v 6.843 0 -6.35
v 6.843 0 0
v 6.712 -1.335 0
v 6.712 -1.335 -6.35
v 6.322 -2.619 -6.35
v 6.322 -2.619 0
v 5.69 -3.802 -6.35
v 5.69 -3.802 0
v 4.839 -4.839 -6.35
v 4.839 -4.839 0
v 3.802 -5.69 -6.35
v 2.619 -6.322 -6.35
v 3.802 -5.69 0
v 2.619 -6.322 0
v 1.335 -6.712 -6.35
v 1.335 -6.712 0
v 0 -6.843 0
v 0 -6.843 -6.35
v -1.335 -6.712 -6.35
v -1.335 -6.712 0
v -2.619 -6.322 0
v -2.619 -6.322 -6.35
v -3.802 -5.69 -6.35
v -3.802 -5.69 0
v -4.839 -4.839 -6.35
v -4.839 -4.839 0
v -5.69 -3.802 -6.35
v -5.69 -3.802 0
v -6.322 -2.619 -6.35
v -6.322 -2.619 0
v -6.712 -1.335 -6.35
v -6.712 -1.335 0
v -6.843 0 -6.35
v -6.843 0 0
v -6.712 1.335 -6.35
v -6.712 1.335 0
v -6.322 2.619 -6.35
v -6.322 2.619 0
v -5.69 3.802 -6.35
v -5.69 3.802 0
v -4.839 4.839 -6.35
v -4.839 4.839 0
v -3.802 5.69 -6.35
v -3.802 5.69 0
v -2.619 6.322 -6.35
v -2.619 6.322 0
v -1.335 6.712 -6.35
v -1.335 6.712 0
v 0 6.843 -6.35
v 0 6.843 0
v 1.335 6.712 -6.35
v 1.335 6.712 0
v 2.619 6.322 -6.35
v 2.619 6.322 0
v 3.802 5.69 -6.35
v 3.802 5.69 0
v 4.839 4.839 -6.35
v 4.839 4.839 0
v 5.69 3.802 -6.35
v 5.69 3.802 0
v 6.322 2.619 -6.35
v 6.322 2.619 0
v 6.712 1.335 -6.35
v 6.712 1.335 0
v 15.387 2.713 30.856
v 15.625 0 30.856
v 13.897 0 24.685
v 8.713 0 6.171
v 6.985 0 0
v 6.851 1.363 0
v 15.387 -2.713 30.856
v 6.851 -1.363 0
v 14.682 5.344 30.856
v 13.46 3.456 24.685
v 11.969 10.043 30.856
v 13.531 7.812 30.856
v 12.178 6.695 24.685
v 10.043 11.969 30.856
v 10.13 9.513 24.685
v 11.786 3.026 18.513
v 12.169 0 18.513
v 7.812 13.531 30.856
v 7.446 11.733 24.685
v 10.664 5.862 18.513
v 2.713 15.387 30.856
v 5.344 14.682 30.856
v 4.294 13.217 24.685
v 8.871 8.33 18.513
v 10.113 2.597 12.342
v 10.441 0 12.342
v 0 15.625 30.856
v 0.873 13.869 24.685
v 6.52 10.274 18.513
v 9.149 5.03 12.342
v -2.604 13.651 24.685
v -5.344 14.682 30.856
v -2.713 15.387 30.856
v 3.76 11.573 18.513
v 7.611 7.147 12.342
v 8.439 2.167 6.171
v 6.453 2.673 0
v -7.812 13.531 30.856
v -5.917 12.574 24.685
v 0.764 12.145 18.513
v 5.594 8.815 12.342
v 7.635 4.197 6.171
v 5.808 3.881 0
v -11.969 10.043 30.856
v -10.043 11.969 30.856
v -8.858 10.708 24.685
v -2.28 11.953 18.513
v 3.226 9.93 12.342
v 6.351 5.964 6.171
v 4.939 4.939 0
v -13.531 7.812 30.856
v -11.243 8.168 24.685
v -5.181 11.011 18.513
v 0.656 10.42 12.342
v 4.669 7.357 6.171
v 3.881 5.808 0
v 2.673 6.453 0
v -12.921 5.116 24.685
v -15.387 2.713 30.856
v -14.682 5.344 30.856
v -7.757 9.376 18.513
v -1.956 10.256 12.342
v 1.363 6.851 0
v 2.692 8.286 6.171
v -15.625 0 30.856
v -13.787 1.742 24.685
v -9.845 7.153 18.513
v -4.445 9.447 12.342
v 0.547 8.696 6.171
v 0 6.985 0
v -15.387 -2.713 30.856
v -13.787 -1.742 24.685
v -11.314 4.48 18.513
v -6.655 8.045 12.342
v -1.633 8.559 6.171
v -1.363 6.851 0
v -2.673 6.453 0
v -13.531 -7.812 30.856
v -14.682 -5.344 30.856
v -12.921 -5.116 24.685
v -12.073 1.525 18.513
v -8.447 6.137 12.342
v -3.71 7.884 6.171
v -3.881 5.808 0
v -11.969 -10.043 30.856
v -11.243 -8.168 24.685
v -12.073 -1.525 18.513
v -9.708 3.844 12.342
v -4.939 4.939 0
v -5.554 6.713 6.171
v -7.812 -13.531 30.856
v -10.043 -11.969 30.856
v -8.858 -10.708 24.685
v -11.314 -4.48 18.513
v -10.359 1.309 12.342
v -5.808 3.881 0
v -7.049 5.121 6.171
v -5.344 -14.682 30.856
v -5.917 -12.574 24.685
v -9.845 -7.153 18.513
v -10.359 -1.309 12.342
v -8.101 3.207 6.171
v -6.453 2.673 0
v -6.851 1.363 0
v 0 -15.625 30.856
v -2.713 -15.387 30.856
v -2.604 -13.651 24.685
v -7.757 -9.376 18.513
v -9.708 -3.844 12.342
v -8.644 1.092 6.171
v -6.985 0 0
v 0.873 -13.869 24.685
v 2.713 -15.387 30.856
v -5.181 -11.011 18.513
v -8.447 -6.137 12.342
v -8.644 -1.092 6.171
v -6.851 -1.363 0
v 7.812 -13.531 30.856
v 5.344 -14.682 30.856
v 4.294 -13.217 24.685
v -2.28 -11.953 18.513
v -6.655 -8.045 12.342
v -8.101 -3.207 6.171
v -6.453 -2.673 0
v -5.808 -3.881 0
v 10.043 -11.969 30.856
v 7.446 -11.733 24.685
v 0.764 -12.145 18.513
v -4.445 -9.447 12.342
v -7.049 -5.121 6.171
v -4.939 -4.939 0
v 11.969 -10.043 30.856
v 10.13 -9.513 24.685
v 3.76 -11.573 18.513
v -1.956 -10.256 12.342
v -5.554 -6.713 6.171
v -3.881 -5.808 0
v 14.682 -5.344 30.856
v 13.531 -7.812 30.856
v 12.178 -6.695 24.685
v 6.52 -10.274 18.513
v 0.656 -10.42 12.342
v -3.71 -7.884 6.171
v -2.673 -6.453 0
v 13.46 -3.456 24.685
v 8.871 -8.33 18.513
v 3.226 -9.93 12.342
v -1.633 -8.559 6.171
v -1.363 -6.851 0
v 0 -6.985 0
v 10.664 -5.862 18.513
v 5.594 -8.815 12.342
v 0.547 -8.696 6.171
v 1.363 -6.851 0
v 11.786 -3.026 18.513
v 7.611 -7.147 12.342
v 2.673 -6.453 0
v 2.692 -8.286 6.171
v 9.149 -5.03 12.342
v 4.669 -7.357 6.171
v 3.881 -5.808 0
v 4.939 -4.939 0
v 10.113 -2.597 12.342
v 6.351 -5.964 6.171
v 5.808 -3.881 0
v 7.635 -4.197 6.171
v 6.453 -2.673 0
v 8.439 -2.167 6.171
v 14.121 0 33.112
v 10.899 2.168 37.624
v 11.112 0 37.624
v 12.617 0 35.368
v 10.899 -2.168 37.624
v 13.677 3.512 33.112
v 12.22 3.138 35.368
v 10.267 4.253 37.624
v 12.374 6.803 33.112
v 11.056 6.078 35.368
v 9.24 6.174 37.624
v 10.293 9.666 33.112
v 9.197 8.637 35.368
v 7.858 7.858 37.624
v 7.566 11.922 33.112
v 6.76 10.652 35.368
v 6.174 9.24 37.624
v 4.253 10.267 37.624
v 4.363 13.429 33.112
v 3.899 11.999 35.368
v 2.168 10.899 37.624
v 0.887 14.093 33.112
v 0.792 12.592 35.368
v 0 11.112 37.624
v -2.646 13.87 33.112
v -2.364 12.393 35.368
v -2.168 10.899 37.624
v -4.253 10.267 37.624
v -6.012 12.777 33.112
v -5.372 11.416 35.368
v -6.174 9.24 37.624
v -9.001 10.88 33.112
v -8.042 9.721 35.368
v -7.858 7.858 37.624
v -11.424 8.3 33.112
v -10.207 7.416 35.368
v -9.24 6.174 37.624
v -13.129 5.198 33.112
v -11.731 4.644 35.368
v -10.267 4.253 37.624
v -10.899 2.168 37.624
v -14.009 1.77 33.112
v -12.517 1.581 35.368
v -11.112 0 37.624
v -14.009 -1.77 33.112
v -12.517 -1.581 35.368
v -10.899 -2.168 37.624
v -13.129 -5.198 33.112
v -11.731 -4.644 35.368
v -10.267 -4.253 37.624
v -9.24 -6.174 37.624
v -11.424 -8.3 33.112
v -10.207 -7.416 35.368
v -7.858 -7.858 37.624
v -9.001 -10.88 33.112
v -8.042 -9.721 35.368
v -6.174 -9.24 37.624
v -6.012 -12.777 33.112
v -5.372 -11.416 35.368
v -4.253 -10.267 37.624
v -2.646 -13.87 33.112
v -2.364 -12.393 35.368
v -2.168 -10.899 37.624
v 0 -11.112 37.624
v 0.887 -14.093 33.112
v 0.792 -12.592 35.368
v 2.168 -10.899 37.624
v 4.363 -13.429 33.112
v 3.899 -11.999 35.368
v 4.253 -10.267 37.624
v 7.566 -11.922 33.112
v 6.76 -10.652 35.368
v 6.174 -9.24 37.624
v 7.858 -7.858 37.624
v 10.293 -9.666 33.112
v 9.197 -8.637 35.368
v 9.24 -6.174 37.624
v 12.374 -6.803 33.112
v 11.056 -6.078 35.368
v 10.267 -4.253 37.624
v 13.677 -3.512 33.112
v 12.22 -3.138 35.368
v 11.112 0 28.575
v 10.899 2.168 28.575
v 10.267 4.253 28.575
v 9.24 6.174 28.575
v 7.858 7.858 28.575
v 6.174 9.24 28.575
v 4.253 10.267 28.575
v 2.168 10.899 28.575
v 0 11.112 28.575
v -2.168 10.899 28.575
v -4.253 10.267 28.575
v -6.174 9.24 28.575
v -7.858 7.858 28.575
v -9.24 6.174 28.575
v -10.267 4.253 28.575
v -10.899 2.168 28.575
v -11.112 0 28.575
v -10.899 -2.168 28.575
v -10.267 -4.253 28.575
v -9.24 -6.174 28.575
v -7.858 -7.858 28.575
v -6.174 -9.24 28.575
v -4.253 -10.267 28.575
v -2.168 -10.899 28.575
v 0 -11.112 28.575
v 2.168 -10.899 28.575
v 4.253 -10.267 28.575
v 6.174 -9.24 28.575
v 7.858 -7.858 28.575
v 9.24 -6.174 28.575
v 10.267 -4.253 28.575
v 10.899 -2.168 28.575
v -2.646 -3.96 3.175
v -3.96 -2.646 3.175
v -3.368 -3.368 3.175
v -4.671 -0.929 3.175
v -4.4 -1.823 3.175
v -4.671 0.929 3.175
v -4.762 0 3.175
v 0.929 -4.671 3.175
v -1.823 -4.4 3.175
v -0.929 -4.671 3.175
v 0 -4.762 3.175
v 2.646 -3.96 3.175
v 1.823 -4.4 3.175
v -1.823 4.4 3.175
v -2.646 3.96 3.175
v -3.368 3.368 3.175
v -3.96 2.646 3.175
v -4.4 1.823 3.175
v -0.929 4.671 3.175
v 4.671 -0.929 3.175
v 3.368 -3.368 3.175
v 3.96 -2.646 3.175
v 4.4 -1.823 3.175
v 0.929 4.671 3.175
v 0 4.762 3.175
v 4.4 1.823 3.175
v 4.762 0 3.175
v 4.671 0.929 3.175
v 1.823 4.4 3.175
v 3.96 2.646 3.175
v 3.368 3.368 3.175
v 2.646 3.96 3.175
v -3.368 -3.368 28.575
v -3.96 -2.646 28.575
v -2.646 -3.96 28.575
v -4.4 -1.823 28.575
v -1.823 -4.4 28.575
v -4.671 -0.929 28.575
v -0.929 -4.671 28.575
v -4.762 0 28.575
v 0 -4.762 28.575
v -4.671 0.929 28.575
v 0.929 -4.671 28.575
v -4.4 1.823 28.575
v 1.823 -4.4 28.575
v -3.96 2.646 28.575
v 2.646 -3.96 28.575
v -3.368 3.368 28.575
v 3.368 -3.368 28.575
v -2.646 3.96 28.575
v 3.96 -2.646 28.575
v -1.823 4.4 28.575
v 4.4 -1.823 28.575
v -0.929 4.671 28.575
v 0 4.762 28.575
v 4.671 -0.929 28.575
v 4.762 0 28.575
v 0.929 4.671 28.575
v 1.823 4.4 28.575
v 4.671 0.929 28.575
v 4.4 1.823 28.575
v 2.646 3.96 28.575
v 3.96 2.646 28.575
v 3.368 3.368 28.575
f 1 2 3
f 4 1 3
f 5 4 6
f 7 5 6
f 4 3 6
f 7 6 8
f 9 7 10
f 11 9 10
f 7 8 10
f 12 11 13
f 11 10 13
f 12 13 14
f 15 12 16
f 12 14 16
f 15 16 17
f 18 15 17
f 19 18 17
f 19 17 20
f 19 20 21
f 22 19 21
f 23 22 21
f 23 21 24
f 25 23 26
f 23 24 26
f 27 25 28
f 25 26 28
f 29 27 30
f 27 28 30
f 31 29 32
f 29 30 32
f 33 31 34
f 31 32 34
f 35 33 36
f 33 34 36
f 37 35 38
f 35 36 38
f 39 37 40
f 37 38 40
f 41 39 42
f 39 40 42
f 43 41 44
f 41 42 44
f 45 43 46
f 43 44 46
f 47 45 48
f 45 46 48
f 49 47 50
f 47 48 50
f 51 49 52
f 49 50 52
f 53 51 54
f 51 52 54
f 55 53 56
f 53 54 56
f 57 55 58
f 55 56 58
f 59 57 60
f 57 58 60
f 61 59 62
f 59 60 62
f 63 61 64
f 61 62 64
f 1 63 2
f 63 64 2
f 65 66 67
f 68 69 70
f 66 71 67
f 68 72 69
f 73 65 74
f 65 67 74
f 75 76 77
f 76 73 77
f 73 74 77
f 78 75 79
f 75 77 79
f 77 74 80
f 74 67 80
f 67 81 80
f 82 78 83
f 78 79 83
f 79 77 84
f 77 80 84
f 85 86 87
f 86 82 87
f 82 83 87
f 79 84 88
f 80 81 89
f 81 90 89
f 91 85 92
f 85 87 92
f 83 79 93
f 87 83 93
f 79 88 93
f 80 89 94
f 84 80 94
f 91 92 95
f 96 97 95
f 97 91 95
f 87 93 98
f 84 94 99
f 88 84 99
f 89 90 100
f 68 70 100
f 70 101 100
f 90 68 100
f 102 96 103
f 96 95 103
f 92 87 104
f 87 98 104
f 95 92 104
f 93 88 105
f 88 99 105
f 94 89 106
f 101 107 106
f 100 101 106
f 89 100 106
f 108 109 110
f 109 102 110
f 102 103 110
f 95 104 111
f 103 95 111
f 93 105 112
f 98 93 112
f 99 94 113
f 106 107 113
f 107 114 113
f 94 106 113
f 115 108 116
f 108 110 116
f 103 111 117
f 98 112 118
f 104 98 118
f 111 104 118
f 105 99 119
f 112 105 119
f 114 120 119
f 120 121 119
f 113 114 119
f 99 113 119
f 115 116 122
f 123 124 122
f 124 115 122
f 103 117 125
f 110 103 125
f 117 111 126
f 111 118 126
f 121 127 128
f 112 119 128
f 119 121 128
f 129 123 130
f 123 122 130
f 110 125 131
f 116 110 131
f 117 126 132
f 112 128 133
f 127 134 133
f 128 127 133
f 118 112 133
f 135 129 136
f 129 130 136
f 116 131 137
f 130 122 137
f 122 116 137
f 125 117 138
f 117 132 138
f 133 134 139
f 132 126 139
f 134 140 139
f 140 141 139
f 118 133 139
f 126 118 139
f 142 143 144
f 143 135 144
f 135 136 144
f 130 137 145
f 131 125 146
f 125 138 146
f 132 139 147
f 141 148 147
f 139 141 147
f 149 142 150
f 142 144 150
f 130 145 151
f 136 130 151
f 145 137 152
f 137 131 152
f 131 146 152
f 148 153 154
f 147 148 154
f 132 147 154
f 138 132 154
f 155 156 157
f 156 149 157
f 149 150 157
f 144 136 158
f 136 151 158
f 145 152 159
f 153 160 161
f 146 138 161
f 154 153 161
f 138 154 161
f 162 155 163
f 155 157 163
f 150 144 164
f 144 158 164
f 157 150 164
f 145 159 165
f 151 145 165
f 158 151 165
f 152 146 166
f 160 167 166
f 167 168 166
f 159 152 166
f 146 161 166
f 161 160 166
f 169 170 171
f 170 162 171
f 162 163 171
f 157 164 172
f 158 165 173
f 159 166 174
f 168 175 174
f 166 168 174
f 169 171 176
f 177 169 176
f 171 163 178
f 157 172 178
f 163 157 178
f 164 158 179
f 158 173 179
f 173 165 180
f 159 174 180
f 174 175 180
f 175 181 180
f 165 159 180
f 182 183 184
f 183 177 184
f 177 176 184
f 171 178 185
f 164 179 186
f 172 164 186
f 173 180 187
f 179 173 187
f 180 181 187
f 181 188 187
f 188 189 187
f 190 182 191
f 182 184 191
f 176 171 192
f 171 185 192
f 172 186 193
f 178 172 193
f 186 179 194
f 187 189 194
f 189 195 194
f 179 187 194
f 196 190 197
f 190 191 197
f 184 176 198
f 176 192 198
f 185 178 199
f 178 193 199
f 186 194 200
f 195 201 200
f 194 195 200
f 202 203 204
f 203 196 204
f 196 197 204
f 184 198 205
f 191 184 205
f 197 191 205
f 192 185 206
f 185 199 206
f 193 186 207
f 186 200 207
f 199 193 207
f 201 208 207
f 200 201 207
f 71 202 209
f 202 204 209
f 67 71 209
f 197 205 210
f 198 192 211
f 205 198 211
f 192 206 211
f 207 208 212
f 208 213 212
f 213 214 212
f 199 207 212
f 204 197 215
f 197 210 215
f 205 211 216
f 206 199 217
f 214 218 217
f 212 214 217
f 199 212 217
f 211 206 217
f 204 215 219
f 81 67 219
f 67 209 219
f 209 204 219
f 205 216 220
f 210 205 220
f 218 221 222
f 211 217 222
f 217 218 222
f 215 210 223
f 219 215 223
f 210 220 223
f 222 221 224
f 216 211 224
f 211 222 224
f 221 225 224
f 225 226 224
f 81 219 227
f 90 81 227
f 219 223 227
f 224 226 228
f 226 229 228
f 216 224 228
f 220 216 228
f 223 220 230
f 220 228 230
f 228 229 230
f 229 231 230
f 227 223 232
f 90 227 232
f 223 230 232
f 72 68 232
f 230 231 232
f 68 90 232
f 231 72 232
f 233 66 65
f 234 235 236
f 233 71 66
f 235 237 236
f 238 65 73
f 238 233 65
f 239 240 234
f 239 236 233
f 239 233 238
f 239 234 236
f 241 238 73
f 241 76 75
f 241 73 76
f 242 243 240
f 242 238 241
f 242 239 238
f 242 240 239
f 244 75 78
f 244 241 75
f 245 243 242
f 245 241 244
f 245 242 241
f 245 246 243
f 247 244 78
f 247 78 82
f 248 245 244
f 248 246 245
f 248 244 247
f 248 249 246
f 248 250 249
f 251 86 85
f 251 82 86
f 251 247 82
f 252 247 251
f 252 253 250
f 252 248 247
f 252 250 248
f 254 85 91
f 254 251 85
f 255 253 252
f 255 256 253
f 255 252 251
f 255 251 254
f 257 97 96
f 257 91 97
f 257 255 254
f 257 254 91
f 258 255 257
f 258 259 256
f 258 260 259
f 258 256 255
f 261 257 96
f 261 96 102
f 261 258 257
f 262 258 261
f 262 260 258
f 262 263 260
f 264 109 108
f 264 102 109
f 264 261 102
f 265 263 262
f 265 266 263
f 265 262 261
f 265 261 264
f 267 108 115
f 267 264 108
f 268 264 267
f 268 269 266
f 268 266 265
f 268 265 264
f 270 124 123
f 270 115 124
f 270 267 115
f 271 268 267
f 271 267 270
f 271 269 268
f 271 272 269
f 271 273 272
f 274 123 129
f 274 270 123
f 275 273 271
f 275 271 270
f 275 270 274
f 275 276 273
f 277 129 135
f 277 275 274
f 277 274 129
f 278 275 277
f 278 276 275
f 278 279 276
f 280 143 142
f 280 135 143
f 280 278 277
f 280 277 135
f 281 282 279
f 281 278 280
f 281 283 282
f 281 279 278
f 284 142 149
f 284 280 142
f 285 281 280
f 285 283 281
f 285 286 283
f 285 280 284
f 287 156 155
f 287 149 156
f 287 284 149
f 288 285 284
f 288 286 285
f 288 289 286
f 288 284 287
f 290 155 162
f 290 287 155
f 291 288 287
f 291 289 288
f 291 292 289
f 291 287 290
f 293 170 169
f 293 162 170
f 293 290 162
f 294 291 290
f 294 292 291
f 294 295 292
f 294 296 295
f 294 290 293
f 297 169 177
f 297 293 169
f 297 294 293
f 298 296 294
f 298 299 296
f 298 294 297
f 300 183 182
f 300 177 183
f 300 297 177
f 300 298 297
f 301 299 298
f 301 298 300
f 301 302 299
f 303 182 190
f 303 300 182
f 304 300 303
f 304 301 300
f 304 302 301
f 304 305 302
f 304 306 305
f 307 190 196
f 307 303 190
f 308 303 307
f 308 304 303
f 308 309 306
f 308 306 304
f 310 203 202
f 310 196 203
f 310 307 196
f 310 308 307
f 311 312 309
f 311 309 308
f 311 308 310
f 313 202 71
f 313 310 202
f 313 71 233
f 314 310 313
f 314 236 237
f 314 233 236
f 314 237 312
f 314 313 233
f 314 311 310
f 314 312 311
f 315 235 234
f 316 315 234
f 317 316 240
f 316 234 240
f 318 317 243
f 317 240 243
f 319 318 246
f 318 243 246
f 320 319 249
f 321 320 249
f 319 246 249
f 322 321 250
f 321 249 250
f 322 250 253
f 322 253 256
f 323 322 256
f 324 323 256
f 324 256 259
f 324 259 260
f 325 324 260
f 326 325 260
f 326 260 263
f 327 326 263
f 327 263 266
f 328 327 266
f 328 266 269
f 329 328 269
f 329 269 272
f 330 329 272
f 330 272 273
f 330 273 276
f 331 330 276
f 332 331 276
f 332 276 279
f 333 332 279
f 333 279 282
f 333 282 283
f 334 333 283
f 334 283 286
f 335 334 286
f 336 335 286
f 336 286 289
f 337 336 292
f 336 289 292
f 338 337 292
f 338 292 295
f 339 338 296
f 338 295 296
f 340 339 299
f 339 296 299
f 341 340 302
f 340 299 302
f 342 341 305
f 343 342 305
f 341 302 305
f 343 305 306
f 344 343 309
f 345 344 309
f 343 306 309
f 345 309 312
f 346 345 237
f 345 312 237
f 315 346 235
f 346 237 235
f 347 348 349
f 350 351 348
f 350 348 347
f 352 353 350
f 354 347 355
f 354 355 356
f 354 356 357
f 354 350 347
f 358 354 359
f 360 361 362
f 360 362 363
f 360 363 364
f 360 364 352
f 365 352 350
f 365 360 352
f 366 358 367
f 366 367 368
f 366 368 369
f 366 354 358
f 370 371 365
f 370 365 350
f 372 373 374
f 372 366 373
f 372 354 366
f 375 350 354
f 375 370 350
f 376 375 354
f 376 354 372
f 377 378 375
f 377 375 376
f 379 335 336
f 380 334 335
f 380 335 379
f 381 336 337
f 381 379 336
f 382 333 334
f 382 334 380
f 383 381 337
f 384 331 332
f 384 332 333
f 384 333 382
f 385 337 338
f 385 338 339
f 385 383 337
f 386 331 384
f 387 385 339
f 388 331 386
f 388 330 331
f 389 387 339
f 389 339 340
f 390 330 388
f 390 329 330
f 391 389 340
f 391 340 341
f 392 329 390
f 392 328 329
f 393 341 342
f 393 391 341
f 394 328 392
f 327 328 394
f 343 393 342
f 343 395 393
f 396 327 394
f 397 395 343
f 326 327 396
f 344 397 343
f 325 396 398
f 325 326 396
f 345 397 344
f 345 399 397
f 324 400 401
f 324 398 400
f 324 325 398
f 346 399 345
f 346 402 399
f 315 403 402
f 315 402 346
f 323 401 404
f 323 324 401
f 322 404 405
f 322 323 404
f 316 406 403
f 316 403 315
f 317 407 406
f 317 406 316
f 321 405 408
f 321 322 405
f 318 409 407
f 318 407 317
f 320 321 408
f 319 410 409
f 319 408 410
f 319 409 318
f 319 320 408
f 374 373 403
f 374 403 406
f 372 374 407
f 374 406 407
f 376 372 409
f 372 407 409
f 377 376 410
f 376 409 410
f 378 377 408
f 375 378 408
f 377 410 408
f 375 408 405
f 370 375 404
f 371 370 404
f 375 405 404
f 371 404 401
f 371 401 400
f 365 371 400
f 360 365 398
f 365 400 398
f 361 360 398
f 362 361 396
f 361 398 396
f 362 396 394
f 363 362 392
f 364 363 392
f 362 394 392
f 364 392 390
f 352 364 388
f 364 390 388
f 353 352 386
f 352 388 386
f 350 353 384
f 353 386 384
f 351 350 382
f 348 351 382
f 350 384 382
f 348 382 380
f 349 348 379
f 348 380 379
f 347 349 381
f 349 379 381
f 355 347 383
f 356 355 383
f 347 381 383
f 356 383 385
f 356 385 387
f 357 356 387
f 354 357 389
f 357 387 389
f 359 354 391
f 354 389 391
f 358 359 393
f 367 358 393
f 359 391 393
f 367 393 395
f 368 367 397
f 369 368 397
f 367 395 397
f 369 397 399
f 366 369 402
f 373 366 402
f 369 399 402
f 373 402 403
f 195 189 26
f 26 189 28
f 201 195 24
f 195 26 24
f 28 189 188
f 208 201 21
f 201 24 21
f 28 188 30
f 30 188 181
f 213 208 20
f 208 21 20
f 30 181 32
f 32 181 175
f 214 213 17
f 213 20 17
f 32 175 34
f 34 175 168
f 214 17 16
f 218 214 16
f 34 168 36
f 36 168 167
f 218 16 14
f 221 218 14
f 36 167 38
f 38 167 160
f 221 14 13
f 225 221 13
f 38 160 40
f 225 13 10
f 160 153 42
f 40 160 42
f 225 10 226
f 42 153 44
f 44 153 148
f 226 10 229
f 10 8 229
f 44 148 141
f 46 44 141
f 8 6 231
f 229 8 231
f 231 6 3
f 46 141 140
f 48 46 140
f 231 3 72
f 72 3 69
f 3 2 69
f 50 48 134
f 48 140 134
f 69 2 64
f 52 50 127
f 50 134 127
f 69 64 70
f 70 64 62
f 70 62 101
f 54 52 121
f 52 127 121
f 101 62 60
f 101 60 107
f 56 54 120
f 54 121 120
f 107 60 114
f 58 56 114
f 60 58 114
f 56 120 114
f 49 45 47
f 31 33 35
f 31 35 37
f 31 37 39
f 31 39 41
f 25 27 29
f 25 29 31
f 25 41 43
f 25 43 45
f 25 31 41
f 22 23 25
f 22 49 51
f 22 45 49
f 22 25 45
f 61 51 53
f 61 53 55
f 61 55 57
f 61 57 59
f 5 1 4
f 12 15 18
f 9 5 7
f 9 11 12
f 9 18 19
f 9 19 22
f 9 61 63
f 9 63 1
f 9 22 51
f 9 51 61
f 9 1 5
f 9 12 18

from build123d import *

# Parameters (mm, degrees)
F0_R     = 15.875
F1_DEPTH = 31.75
F2_R     = 6.8433299252
F3_DEPTH = 6.35
F4_DEPTH = 6.35
F5_R     = 11.1125
F6_DEPTH = 9.525
F7_R     = 4.7625
F8_DEPTH = 25.4
F9_SIZE2 = 8.89
F9_SIZE  = 31.75


# Not quite as in the source:
# - a fillet or chamfer that OpenCascade refuses, or shapes differently, is made with other operations: its cross-section is extruded or revolved along the edge and cut away or added


with BuildPart() as f1:
    # F0 (on Top) → F1 (new body)
    with BuildSketch(Plane.XY):
        Circle(F0_R)
    extrude(amount=F1_DEPTH)

    # F2 (on face) → F3 (join)
    with BuildSketch(Plane(origin=(0, 0, 0), x_dir=(1, 0, 0), z_dir=(0, 0, -1))):
        Circle(F2_R)
    extrude(amount=F3_DEPTH)

    # F4 (add): a face of the model
    f4_faces = [f1.faces().sort_by_distance(p)[0] for p in [
        (0, 0, 31.75),
    ]]
    extrude(f4_faces, amount=F4_DEPTH)

    # F5 (on face) → F6 (cut)
    with BuildSketch(Plane.XY.offset(38.1)):
        Circle(F5_R)
    extrude(amount=-F6_DEPTH, mode=Mode.SUBTRACT)

    # F7 (on face) → F8 (cut)
    with BuildSketch(Plane.XY.offset(28.575)):
        Circle(F7_R)
    extrude(amount=-F8_DEPTH, mode=Mode.SUBTRACT)

    # F9
    f9_edges = [f1.edges().sort_by_distance(p)[0] for p in [
        (-15.875, 0, 0),
    ]]
    f9_side = f1.faces().sort_by_distance((-15.875, 0, 19.05))[0]
    chamfer(f9_edges, length=F9_SIZE, length2=F9_SIZE2, reference=f9_side)

    # F10: chamfer of 5.08 x 7.62 on 1 edges, made by hand

    # F10_s1 → F10_t2 (revolve, cut)
    with BuildSketch(Plane.XZ):
        Polygon((15.875, 30.48), (10.795, 38.1), (15.875, 38.1), align=None)
    revolve(axis=Axis((0, 0, 38.1), (0, 0, 1)), mode=Mode.SUBTRACT)


solid = f1.part
